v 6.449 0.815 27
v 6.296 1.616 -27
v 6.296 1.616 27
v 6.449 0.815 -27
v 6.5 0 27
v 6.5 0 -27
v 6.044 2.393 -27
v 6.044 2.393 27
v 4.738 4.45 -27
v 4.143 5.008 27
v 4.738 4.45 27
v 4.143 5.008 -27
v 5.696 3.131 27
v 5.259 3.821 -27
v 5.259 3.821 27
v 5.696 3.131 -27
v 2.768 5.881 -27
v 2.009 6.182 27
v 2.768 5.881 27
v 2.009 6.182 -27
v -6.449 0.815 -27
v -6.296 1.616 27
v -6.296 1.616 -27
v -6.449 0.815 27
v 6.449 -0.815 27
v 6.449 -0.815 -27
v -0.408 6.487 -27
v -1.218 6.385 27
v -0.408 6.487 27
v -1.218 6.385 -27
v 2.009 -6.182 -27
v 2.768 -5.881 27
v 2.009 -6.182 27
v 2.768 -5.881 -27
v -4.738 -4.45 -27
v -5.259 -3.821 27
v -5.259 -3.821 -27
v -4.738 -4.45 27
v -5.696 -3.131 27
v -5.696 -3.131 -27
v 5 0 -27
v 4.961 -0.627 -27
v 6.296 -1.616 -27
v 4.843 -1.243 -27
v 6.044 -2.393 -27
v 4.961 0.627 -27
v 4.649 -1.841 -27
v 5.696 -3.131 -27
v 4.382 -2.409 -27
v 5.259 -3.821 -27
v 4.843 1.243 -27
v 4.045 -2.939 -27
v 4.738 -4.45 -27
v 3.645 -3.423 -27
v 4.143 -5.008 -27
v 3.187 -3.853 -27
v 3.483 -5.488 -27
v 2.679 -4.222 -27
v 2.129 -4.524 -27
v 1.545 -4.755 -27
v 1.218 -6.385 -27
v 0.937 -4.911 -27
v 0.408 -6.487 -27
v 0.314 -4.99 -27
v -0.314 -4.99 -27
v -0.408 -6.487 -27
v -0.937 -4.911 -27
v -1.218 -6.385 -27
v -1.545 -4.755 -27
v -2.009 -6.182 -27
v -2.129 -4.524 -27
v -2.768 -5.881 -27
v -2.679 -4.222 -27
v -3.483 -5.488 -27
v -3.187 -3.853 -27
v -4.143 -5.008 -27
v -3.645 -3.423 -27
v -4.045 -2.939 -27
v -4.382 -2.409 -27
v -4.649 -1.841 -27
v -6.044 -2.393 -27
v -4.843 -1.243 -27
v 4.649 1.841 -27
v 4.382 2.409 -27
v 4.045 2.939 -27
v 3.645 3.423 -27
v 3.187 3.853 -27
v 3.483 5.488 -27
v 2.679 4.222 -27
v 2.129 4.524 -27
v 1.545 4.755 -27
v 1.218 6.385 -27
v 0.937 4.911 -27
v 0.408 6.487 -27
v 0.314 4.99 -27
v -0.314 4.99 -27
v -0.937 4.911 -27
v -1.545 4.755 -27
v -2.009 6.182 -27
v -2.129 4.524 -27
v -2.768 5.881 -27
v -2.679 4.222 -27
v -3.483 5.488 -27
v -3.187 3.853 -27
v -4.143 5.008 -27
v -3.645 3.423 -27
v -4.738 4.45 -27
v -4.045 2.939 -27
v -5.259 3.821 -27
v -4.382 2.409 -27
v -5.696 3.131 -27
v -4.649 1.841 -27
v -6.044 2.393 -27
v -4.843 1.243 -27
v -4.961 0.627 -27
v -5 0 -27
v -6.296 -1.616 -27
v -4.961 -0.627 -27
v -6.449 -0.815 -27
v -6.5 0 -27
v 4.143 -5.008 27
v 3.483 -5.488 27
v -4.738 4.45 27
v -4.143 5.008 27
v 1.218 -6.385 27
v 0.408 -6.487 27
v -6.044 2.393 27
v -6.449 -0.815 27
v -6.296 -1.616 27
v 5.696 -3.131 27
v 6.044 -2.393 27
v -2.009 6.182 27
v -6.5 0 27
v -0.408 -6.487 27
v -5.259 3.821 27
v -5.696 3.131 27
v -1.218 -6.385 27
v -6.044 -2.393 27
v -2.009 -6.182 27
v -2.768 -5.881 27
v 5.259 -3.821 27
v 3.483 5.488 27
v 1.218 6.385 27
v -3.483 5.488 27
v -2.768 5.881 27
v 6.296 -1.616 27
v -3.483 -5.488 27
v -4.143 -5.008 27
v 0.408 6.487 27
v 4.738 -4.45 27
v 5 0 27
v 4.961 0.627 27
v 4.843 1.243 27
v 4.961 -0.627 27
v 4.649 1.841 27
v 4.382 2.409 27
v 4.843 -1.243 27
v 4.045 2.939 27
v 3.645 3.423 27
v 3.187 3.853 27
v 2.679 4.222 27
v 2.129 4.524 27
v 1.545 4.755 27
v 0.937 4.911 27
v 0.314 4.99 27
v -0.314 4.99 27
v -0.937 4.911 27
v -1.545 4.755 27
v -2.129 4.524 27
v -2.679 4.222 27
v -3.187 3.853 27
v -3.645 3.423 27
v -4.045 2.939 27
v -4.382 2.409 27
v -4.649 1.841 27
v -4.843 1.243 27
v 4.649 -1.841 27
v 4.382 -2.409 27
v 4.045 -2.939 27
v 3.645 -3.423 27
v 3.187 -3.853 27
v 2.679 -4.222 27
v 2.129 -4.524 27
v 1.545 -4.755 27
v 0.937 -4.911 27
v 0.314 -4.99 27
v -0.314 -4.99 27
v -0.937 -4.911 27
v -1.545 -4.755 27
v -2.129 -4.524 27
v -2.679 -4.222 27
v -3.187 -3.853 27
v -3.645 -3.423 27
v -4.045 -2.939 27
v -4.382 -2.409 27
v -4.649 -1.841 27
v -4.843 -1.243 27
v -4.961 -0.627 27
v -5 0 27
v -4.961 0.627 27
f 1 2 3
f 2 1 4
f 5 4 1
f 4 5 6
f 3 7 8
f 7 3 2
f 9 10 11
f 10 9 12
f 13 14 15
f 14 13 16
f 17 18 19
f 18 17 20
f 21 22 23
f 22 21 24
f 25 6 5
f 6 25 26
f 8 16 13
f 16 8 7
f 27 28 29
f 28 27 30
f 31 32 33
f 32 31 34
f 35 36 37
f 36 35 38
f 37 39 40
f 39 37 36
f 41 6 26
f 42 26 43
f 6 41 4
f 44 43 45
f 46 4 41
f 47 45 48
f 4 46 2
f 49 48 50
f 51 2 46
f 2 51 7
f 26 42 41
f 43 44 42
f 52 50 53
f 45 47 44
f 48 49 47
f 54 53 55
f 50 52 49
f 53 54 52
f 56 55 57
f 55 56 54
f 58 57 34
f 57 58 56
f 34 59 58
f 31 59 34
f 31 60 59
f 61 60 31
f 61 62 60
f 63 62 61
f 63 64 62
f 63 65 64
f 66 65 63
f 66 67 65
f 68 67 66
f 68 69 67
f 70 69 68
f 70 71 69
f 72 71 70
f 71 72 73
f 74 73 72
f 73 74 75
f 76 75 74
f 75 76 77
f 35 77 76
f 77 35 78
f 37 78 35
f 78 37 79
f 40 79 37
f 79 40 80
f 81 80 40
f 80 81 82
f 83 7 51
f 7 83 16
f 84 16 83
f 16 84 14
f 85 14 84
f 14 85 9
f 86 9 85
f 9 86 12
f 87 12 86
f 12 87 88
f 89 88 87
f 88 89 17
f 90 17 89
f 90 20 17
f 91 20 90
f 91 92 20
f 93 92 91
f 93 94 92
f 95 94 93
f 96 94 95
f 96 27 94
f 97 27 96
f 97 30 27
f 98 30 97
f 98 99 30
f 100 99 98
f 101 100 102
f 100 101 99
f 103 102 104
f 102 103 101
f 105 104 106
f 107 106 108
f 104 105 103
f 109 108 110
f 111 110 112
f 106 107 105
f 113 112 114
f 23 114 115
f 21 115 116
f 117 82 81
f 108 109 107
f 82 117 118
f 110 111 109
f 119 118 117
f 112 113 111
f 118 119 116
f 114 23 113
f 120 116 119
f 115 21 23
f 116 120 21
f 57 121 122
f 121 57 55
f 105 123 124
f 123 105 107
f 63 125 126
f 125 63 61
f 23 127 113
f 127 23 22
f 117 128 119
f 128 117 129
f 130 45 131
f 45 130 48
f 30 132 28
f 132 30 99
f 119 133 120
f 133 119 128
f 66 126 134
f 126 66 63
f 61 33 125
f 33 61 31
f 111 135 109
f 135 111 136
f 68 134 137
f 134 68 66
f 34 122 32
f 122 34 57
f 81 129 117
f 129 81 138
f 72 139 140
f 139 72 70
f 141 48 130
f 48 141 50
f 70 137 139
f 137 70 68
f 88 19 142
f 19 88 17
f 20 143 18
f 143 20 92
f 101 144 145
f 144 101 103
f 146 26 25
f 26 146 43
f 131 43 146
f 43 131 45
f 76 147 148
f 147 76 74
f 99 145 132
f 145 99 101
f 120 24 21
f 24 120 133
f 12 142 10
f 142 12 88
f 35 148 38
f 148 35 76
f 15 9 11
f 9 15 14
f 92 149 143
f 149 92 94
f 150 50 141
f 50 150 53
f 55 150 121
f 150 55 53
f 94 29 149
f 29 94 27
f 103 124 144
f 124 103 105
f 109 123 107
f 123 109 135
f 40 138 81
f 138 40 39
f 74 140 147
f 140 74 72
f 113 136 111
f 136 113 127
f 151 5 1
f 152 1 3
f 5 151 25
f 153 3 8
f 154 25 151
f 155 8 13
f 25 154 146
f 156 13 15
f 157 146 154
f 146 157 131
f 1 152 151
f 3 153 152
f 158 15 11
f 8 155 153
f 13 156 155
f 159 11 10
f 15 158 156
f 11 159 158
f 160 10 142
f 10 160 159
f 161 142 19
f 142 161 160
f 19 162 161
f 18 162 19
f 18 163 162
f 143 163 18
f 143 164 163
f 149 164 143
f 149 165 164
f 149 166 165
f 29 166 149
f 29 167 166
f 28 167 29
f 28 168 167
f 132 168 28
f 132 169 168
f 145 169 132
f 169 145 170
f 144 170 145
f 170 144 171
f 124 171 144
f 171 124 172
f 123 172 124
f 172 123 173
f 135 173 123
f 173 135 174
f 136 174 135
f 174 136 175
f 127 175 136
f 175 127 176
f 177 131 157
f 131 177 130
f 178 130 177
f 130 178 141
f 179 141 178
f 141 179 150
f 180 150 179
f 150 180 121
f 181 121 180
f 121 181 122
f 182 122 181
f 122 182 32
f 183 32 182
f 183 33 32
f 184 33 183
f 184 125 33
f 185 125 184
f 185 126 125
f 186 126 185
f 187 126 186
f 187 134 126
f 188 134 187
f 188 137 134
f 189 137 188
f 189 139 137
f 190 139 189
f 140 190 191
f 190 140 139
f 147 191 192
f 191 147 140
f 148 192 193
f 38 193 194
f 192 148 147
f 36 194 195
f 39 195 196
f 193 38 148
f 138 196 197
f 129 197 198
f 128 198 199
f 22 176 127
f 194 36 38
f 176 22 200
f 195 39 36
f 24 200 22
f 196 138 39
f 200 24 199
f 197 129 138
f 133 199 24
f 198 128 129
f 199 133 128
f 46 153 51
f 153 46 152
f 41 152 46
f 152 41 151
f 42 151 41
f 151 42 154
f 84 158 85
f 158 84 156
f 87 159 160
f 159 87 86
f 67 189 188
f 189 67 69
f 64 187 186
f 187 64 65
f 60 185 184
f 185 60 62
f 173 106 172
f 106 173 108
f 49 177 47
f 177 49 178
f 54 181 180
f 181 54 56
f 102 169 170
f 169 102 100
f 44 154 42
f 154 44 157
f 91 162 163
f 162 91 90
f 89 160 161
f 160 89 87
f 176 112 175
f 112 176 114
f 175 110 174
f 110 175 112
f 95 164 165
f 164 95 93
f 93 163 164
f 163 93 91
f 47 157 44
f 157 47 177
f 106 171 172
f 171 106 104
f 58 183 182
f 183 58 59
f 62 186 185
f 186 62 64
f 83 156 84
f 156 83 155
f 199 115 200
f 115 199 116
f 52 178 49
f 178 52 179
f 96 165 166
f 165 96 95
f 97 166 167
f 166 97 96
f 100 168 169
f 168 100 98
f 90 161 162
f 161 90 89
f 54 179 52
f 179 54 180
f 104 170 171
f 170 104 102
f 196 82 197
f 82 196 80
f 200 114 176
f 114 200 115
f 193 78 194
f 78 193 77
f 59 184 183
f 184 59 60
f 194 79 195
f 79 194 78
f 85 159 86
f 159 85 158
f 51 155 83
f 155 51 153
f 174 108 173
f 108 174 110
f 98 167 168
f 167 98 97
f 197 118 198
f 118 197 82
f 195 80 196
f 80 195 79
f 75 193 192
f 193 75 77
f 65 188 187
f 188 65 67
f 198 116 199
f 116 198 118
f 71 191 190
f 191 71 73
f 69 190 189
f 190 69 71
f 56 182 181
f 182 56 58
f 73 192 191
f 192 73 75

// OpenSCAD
$fn = 50;


difference() {
	union() {
		translate(v = [0, 0, -27.0000000000]) {
			cylinder(h = 54, r = 6.5000000000);
		}
	}
	union() {
		translate(v = [0, 0, -100.0000000000]) {
			cylinder(h = 200, r = 5.0000000000);
		}
	}
}
